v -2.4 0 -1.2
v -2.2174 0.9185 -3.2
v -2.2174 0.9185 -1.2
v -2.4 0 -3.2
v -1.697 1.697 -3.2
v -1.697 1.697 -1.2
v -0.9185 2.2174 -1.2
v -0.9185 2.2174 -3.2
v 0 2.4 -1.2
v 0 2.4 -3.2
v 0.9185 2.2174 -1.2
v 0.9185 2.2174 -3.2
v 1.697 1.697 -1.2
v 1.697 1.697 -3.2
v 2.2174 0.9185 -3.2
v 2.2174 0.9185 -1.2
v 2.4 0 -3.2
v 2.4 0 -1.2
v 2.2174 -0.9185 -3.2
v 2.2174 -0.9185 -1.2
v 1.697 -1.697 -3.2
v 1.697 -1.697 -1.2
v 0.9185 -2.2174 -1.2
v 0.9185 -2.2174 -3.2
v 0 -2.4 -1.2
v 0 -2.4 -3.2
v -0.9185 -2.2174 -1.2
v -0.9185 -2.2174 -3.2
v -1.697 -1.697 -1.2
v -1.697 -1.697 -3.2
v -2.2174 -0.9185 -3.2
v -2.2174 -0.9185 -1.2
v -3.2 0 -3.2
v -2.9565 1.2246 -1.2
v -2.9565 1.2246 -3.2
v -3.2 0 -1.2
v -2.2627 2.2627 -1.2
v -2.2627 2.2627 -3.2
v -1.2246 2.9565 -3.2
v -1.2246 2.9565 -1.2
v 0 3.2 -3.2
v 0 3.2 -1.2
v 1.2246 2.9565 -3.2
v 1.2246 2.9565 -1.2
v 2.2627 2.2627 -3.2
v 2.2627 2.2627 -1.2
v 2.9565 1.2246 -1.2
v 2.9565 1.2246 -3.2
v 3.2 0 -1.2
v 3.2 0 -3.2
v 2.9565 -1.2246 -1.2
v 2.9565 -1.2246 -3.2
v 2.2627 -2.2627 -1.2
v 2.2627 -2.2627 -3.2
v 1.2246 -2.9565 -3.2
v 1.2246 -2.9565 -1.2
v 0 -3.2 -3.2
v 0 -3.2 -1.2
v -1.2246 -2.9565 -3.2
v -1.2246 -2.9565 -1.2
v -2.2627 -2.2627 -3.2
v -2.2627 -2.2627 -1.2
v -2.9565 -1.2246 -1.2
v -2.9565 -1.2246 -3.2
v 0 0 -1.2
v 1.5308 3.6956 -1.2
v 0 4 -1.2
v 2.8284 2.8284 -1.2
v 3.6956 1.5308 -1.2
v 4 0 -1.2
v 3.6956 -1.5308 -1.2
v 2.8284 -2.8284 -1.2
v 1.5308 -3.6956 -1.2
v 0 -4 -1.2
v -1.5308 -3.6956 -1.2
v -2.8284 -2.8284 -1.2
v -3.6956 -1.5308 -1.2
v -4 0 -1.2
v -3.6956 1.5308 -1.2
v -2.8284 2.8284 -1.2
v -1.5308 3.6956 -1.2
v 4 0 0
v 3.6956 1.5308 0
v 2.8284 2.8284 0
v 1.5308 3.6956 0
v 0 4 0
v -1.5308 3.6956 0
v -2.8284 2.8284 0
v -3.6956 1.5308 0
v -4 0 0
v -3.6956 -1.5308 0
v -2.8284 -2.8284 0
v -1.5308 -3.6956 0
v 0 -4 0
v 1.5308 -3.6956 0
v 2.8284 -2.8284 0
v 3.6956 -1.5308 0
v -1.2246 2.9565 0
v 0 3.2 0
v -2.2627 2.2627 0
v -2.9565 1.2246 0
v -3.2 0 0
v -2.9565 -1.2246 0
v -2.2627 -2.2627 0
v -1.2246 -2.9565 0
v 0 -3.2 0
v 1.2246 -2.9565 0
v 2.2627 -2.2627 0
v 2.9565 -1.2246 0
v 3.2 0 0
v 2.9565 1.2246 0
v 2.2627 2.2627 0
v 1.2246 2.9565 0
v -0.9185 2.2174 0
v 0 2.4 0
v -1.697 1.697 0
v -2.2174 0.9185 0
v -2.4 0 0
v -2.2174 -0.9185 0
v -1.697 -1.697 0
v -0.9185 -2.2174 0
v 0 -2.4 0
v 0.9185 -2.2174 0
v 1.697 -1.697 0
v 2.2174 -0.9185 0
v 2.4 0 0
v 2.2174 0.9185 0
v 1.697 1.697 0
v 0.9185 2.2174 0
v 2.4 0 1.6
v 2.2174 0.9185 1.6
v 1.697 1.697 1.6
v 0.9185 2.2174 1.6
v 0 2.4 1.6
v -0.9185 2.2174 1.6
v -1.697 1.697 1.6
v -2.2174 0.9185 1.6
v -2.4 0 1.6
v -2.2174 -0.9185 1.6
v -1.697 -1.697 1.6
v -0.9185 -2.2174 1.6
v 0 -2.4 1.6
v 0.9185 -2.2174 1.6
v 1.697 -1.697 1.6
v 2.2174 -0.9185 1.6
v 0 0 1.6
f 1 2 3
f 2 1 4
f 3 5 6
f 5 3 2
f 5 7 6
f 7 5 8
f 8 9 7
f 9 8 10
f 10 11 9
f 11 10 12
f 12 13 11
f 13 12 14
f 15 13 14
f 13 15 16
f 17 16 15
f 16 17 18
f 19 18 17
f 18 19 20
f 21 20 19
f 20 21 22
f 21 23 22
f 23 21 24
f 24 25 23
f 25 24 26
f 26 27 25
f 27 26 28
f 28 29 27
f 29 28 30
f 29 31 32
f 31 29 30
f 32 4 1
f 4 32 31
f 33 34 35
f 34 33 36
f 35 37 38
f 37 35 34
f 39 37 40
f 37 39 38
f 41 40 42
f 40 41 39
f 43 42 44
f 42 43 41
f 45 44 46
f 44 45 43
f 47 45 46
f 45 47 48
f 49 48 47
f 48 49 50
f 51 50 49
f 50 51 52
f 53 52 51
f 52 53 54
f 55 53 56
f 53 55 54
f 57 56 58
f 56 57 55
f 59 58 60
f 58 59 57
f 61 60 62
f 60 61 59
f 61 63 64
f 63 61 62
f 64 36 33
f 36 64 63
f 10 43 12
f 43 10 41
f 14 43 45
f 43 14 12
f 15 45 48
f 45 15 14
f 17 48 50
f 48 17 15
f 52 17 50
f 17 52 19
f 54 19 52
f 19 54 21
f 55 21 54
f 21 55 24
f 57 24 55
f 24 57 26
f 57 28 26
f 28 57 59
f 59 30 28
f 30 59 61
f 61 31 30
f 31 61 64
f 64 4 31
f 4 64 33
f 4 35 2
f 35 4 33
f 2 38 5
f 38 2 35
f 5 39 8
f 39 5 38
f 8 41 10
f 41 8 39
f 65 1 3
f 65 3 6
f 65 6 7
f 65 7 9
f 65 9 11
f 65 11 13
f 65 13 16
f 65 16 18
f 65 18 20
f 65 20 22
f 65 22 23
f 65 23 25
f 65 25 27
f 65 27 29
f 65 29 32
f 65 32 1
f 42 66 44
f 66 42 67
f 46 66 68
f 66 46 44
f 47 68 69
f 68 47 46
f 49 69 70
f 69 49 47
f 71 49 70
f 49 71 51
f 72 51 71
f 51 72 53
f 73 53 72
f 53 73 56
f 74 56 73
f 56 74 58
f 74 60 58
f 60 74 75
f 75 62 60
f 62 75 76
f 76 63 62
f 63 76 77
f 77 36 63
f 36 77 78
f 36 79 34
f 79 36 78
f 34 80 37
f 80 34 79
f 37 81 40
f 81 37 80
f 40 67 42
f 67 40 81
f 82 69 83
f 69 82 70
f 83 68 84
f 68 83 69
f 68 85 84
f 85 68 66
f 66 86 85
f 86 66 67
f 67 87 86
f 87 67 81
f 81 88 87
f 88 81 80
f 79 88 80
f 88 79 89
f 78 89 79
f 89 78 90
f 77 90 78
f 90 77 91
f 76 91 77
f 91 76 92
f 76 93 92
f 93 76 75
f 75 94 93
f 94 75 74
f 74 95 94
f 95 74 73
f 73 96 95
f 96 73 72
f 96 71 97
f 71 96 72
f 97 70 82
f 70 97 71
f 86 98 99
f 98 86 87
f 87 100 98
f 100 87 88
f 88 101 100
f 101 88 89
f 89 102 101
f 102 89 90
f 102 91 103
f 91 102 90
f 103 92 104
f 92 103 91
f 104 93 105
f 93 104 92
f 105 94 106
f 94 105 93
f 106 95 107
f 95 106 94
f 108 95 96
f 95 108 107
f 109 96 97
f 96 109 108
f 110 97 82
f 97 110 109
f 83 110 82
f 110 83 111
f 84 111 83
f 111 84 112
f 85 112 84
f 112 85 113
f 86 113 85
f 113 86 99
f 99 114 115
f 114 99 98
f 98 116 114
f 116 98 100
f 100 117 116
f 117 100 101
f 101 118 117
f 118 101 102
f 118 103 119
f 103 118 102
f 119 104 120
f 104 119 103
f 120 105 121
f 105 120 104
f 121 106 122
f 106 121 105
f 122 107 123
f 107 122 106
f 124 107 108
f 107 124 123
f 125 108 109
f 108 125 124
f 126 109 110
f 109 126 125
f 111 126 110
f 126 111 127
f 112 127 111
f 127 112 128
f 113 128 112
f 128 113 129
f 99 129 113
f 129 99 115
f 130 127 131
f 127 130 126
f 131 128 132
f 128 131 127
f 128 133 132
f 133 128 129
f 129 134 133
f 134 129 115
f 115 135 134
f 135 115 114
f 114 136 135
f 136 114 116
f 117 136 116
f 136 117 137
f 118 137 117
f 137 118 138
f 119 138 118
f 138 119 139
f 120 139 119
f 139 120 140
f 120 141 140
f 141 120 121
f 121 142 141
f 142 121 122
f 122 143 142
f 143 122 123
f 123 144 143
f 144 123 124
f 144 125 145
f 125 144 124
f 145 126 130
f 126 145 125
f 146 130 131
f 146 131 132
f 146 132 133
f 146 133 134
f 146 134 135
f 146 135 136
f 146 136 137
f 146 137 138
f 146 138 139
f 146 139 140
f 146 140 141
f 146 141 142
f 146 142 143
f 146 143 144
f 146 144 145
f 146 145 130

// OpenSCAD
// file: ../p/4-4edge.scad
use <../lib.scad>
function ldraw_lib__4_4edge() = [
// 0 Circle 1.0
// 0 Name: 4-4edge.dat
// 0 Author: James Jessiman
// 0 !LDRAW_ORG Primitive UPDATE 2017-01
// 0 !LICENSE Licensed under CC BY 2.0 and CC BY 4.0 : see CAreadme.txt
// 
// 0 BFC CERTIFY CCW
  [0,"BFC","CERTIFY"],
  [0,"BFC","CCW"],
// 
// 0 !HISTORY 1998-12-15 [PTadmin] Official Update 1998-10
// 0 !HISTORY 2005-12-28 [PTadmin] Official Update 2005-01
// 0 !HISTORY 2007-06-24 [PTadmin] Header formatted for Contributor Agreement
// 0 !HISTORY 2008-07-01 [PTadmin] Official Update 2008-01
// 0 !HISTORY 2017-01-15 [Steffen] BFCed
// 0 !HISTORY 2017-12-30 [PTadmin] Official Update 2017-01
// 
// 
// 2 24 1 0 0 0.9239 0 0.3827
  [2,24,1,0,0,0.9239,0,0.3827],
// 2 24 0.9239 0 0.3827 0.7071 0 0.7071
  [2,24,0.9239,0,0.3827,0.7071,0,0.7071],
// 2 24 0.7071 0 0.7071 0.3827 0 0.9239
  [2,24,0.7071,0,0.7071,0.3827,0,0.9239],
// 2 24 0.3827 0 0.9239 0 0 1
  [2,24,0.3827,0,0.9239,0,0,1],
// 2 24 0 0 1 -0.3827 0 0.9239
  [2,24,0,0,1,-0.3827,0,0.9239],
// 2 24 -0.3827 0 0.9239 -0.7071 0 0.7071
  [2,24,-0.3827,0,0.9239,-0.7071,0,0.7071],
// 2 24 -0.7071 0 0.7071 -0.9239 0 0.3827
  [2,24,-0.7071,0,0.7071,-0.9239,0,0.3827],
// 2 24 -0.9239 0 0.3827 -1 0 -0
  [2,24,-0.9239,0,0.3827,-1,0,-0],
// 2 24 -1 0 -0 -0.9239 0 -0.3827
  [2,24,-1,0,-0,-0.9239,0,-0.3827],
// 2 24 -0.9239 0 -0.3827 -0.7071 0 -0.7071
  [2,24,-0.9239,0,-0.3827,-0.7071,0,-0.7071],
// 2 24 -0.7071 0 -0.7071 -0.3827 0 -0.9239
  [2,24,-0.7071,0,-0.7071,-0.3827,0,-0.9239],
// 2 24 -0.3827 0 -0.9239 0 0 -1
  [2,24,-0.3827,0,-0.9239,0,0,-1],
// 2 24 0 0 -1 0.3827 0 -0.9239
  [2,24,0,0,-1,0.3827,0,-0.9239],
// 2 24 0.3827 0 -0.9239 0.7071 0 -0.7071
  [2,24,0.3827,0,-0.9239,0.7071,0,-0.7071],
// 2 24 0.7071 0 -0.7071 0.9239 0 -0.3827
  [2,24,0.7071,0,-0.7071,0.9239,0,-0.3827],
// 2 24 0.9239 0 -0.3827 1 0 0
  [2,24,0.9239,0,-0.3827,1,0,0],
];
makepoly(ldraw_lib__4_4edge(), line=0.2);
// file: ../p/4-4cyli.scad
use <../lib.scad>
function ldraw_lib__4_4cyli() = [
// 0 Cylinder 1.0
// 0 Name: 4-4cyli.dat
// 0 Author: James Jessiman
// 0 !LDRAW_ORG Primitive UPDATE 2005-01
// 0 !LICENSE Licensed under CC BY 2.0 and CC BY 4.0 : see CAreadme.txt
// 
// 0 BFC CERTIFY CCW
  [0,"BFC","CERTIFY"],
  [0,"BFC","CCW"],
// 
// 0 !HISTORY 1998-12-15 [PTadmin] Official Update 1998-10
// 0 !HISTORY 2002-03-23 [sbliss] Added BFC statement; merged headers from files in distributions LDraw 0.27 and Complete.
// 0 !HISTORY 2002-04-25 [PTadmin] Official Update 2002-02
// 0 !HISTORY 2004-12-14 [guyvivan] BFC CCW
// 0 !HISTORY 2005-12-28 [PTadmin] Official Update 2005-01
// 0 !HISTORY 2007-06-24 [PTadmin] Header formatted for Contributor Agreement
// 0 !HISTORY 2008-07-01 [PTadmin] Official Update 2008-01
// 
// 
// 4 16 1 1 0 0.9239 1 0.3827 0.9239 0 0.3827 1 0 0
  [4,16,1,1,0,0.9239,1,0.3827,0.9239,0,0.3827,1,0,0],
// 5 24 1 0 0 1 1 0 0.9239 0 0.3827 0.9239 0 -0.3827
  [5,24,1,0,0,1,1,0,0.9239,0,0.3827,0.9239,0,-0.3827],
// 4 16 0.9239 1 0.3827 0.7071 1 0.7071 0.7071 0 0.7071 0.9239 0 0.3827
  [4,16,0.9239,1,0.3827,0.7071,1,0.7071,0.7071,0,0.7071,0.9239,0,0.3827],
// 5 24 0.9239 0 0.3827 0.9239 1 0.3827 0.7071 0 0.7071 1 0 0
  [5,24,0.9239,0,0.3827,0.9239,1,0.3827,0.7071,0,0.7071,1,0,0],
// 4 16 0.7071 1 0.7071 0.3827 1 0.9239 0.3827 0 0.9239 0.7071 0 0.7071
  [4,16,0.7071,1,0.7071,0.3827,1,0.9239,0.3827,0,0.9239,0.7071,0,0.7071],
// 5 24 0.7071 0 0.7071 0.7071 1 0.7071 0.3827 0 0.9239 0.9239 0 0.3827
  [5,24,0.7071,0,0.7071,0.7071,1,0.7071,0.3827,0,0.9239,0.9239,0,0.3827],
// 4 16 0.3827 1 0.9239 0 1 1 0 0 1 0.3827 0 0.9239
  [4,16,0.3827,1,0.9239,0,1,1,0,0,1,0.3827,0,0.9239],
// 5 24 0.3827 0 0.9239 0.3827 1 0.9239 0 0 1 0.7071 0 0.7071
  [5,24,0.3827,0,0.9239,0.3827,1,0.9239,0,0,1,0.7071,0,0.7071],
// 4 16 0 1 1 -0.3827 1 0.9239 -0.3827 0 0.9239 0 0 1
  [4,16,0,1,1,-0.3827,1,0.9239,-0.3827,0,0.9239,0,0,1],
// 5 24 0 0 1 0 1 1 -0.3827 0 0.9239 0.3827 0 0.9239
  [5,24,0,0,1,0,1,1,-0.3827,0,0.9239,0.3827,0,0.9239],
// 4 16 -0.3827 1 0.9239 -0.7071 1 0.7071 -0.7071 0 0.7071 -0.3827 0 0.9239
  [4,16,-0.3827,1,0.9239,-0.7071,1,0.7071,-0.7071,0,0.7071,-0.3827,0,0.9239],
// 5 24 -0.3827 0 0.9239 -0.3827 1 0.9239 -0.7071 0 0.7071 0 0 1
  [5,24,-0.3827,0,0.9239,-0.3827,1,0.9239,-0.7071,0,0.7071,0,0,1],
// 4 16 -0.7071 1 0.7071 -0.9239 1 0.3827 -0.9239 0 0.3827 -0.7071 0 0.7071
  [4,16,-0.7071,1,0.7071,-0.9239,1,0.3827,-0.9239,0,0.3827,-0.7071,0,0.7071],
// 5 24 -0.7071 0 0.7071 -0.7071 1 0.7071 -0.9239 0 0.3827 -0.3827 0 0.9239
  [5,24,-0.7071,0,0.7071,-0.7071,1,0.7071,-0.9239,0,0.3827,-0.3827,0,0.9239],
// 4 16 -0.9239 1 0.3827 -1 1 0 -1 0 0 -0.9239 0 0.3827
  [4,16,-0.9239,1,0.3827,-1,1,0,-1,0,0,-0.9239,0,0.3827],
// 5 24 -0.9239 0 0.3827 -0.9239 1 0.3827 -1 0 0 -0.7071 0 0.7071
  [5,24,-0.9239,0,0.3827,-0.9239,1,0.3827,-1,0,0,-0.7071,0,0.7071],
// 4 16 -1 1 0 -0.9239 1 -0.3827 -0.9239 0 -0.3827 -1 0 0
  [4,16,-1,1,0,-0.9239,1,-0.3827,-0.9239,0,-0.3827,-1,0,0],
// 5 24 -1 0 0 -1 1 0 -0.9239 0 -0.3827 -0.9239 0 0.3827
  [5,24,-1,0,0,-1,1,0,-0.9239,0,-0.3827,-0.9239,0,0.3827],
// 4 16 -0.9239 1 -0.3827 -0.7071 1 -0.7071 -0.7071 0 -0.7071 -0.9239 0 -0.3827
  [4,16,-0.9239,1,-0.3827,-0.7071,1,-0.7071,-0.7071,0,-0.7071,-0.9239,0,-0.3827],
// 5 24 -0.9239 0 -0.3827 -0.9239 1 -0.3827 -0.7071 0 -0.7071 -1 0 0
  [5,24,-0.9239,0,-0.3827,-0.9239,1,-0.3827,-0.7071,0,-0.7071,-1,0,0],
// 4 16 -0.7071 1 -0.7071 -0.3827 1 -0.9239 -0.3827 0 -0.9239 -0.7071 0 -0.7071
  [4,16,-0.7071,1,-0.7071,-0.3827,1,-0.9239,-0.3827,0,-0.9239,-0.7071,0,-0.7071],
// 5 24 -0.7071 0 -0.7071 -0.7071 1 -0.7071 -0.3827 0 -0.9239 -0.9239 0 -0.3827
  [5,24,-0.7071,0,-0.7071,-0.7071,1,-0.7071,-0.3827,0,-0.9239,-0.9239,0,-0.3827],
// 4 16 -0.3827 1 -0.9239 0 1 -1 0 0 -1 -0.3827 0 -0.9239
  [4,16,-0.3827,1,-0.9239,0,1,-1,0,0,-1,-0.3827,0,-0.9239],
// 5 24 -0.3827 0 -0.9239 -0.3827 1 -0.9239 0 0 -1 -0.7071 0 -0.7071
  [5,24,-0.3827,0,-0.9239,-0.3827,1,-0.9239,0,0,-1,-0.7071,0,-0.7071],
// 4 16 0 1 -1 0.3827 1 -0.9239 0.3827 0 -0.9239 0 0 -1
  [4,16,0,1,-1,0.3827,1,-0.9239,0.3827,0,-0.9239,0,0,-1],
// 5 24 0 0 -1 0 1 -1 0.3827 0 -0.9239 -0.3827 0 -0.9239
  [5,24,0,0,-1,0,1,-1,0.3827,0,-0.9239,-0.3827,0,-0.9239],
// 4 16 0.3827 1 -0.9239 0.7071 1 -0.7071 0.7071 0 -0.7071 0.3827 0 -0.9239
  [4,16,0.3827,1,-0.9239,0.7071,1,-0.7071,0.7071,0,-0.7071,0.3827,0,-0.9239],
// 5 24 0.3827 0 -0.9239 0.3827 1 -0.9239 0.7071 0 -0.7071 0 0 -1
  [5,24,0.3827,0,-0.9239,0.3827,1,-0.9239,0.7071,0,-0.7071,0,0,-1],
// 4 16 0.7071 1 -0.7071 0.9239 1 -0.3827 0.9239 0 -0.3827 0.7071 0 -0.7071
  [4,16,0.7071,1,-0.7071,0.9239,1,-0.3827,0.9239,0,-0.3827,0.7071,0,-0.7071],
// 5 24 0.7071 0 -0.7071 0.7071 1 -0.7071 0.9239 0 -0.3827 0.3827 0 -0.9239
  [5,24,0.7071,0,-0.7071,0.7071,1,-0.7071,0.9239,0,-0.3827,0.3827,0,-0.9239],
// 4 16 0.9239 1 -0.3827 1 1 0 1 0 0 0.9239 0 -0.3827
  [4,16,0.9239,1,-0.3827,1,1,0,1,0,0,0.9239,0,-0.3827],
// 5 24 0.9239 0 -0.3827 0.9239 1 -0.3827 1 0 0 0.7071 0 -0.7071
  [5,24,0.9239,0,-0.3827,0.9239,1,-0.3827,1,0,0,0.7071,0,-0.7071],
// 0
];
makepoly(ldraw_lib__4_4cyli(), line=0.2);
// file: ../p/stud4.scad
use <../lib.scad>
use <4-4cyli.scad>
use <4-4edge.scad>
use <4-4ring3.scad>
function ldraw_lib__stud4() = [
// 0 Stud Tube Open
// 0 Name: stud4.dat
// 0 Author: James Jessiman
// 0 !LDRAW_ORG Primitive UPDATE 2009-02
// 0 !LICENSE Licensed under CC BY 2.0 and CC BY 4.0 : see CAreadme.txt
// 
// 0 BFC CERTIFY CCW
  [0,"BFC","CERTIFY"],
  [0,"BFC","CCW"],
// 
// 0 !HISTORY 1999-07-05 [PTadmin] Official Update 1999-05
// 0 !HISTORY 2002-04-04 [sbliss] Modified for BFC compliance
// 0 !HISTORY 2002-04-25 [PTadmin] Official Update 2002-02
// 0 !HISTORY 2007-06-24 [PTadmin] Header formatted for Contributor Agreement
// 0 !HISTORY 2008-07-01 [PTadmin] Official Update 2008-01
// 0 !HISTORY 2009-06-21 [cwdee] Update ring references to 4-4ring
// 0 !HISTORY 2009-09-03 [PTadmin] Official Update 2009-02
// 
// 
// 1 16 0 -4 0 6 0 0 0 1 0 0 0 6 4-4edge.dat
  [1,16,0,-4,0,6,0,0,0,1,0,0,0,6, ldraw_lib__4_4edge()],
// 1 16 0 -4 0 8 0 0 0 1 0 0 0 8 4-4edge.dat
  [1,16,0,-4,0,8,0,0,0,1,0,0,0,8, ldraw_lib__4_4edge()],
// 1 16 0 0 0 6 0 0 0 1 0 0 0 6 4-4edge.dat
  [1,16,0,0,0,6,0,0,0,1,0,0,0,6, ldraw_lib__4_4edge()],
// 1 16 0 0 0 8 0 0 0 1 0 0 0 8 4-4edge.dat
  [1,16,0,0,0,8,0,0,0,1,0,0,0,8, ldraw_lib__4_4edge()],
// 0 BFC INVERTNEXT
  [0,"BFC","INVERTNEXT"],
// 1 16 0 -4 0 6 0 0 0 4 0 0 0 6 4-4cyli.dat
  [1,16,0,-4,0,6,0,0,0,4,0,0,0,6, ldraw_lib__4_4cyli()],
// 1 16 0 -4 0 8 0 0 0 4 0 0 0 8 4-4cyli.dat
  [1,16,0,-4,0,8,0,0,0,4,0,0,0,8, ldraw_lib__4_4cyli()],
// 1 16 0 -4 0 2 0 0 0 1 0 0 0 2 4-4ring3.dat
  [1,16,0,-4,0,2,0,0,0,1,0,0,0,2, ldraw_lib__4_4ring3()],
// 0
];
makepoly(ldraw_lib__stud4(), line=0.2);
// file: ../p/stud.scad
use <../lib.scad>
use <4-4cyli.scad>
use <4-4disc.scad>
use <4-4edge.scad>
function ldraw_lib__stud() = [
// 0 Stud
// 0 Name: stud.dat
// 0 Author: James Jessiman
// 0 !LDRAW_ORG Primitive UPDATE 2012-01
// 0 !LICENSE Licensed under CC BY 2.0 and CC BY 4.0 : see CAreadme.txt
// 
// 0 BFC CERTIFY CCW
  [0,"BFC","CERTIFY"],
  [0,"BFC","CCW"],
// 
// 0 !HISTORY 2002-04-04 [sbliss] Modified for BFC compliance
// 0 !HISTORY 2002-04-25 [PTadmin] Official Update 2002-02
// 0 !HISTORY 2007-06-24 [PTadmin] Header formatted for Contributor Agreement
// 0 !HISTORY 2008-07-01 [PTadmin] Official Update 2008-01
// 0 !HISTORY 2012-02-16 [Philo] Changed to CCW
// 0 !HISTORY 2012-03-30 [PTadmin] Official Update 2012-01
// 
// 
// 1 16 0 0 0 6 0 0 0 1 0 0 0 6 4-4edge.dat
  [1,16,0,0,0,6,0,0,0,1,0,0,0,6, ldraw_lib__4_4edge()],
// 1 16 0 -4 0 6 0 0 0 1 0 0 0 6 4-4edge.dat
  [1,16,0,-4,0,6,0,0,0,1,0,0,0,6, ldraw_lib__4_4edge()],
// 1 16 0 0 0 6 0 0 0 -4 0 0 0 6 4-4cyli.dat
  [1,16,0,0,0,6,0,0,0,-4,0,0,0,6, ldraw_lib__4_4cyli()],
// 1 16 0 -4 0 6 0 0 0 1 0 0 0 6 4-4disc.dat
  [1,16,0,-4,0,6,0,0,0,1,0,0,0,6, ldraw_lib__4_4disc()],
];
makepoly(ldraw_lib__stud(), line=0.2);
// file: ../p/4-4ring4.scad
use <../lib.scad>
function ldraw_lib__4_4ring4() = [
// 0 Ring  4 x 1.0
// 0 Name: 4-4ring4.dat
// 0 Author: James Jessiman
// 0 !LDRAW_ORG Primitive UPDATE 2009-01
// 0 !LICENSE Licensed under CC BY 2.0 and CC BY 4.0 : see CAreadme.txt
// 
// 0 BFC CERTIFY CCW
  [0,"BFC","CERTIFY"],
  [0,"BFC","CCW"],
// 
// 0 !HISTORY 1998-12-15 [PTadmin] Official Update 1998-10
// 0 !HISTORY 2002-04-08 [BrickCaster] Modified for BFC compliance
// 0 !HISTORY 2002-04-25 [PTadmin] Official Update 2002-02
// 0 !HISTORY 2007-06-24 [PTadmin] Header formatted for Contributor Agreement
// 0 !HISTORY 2008-07-01 [PTadmin] Official Update 2008-01
// 0 !HISTORY 2008-08-26 [cwdee] Switch polygon winding and rename
// 0 !HISTORY 2009-05-02 [PTadmin] Official Update 2009-01
// 
// 
// 4 16 -1.9135 0 4.6195 -1.5308 0 3.6956 0 0 4 0 0 5
  [4,16,-1.9135,0,4.6195,-1.5308,0,3.6956,0,0,4,0,0,5],
// 4 16 -3.5355 0 3.5355 -2.8284 0 2.8284 -1.5308 0 3.6956 -1.9135 0 4.6195
  [4,16,-3.5355,0,3.5355,-2.8284,0,2.8284,-1.5308,0,3.6956,-1.9135,0,4.6195],
// 4 16 -4.6195 0 1.9135 -3.6956 0 1.5308 -2.8284 0 2.8284 -3.5355 0 3.5355
  [4,16,-4.6195,0,1.9135,-3.6956,0,1.5308,-2.8284,0,2.8284,-3.5355,0,3.5355],
// 4 16 -5 0 0 -4 0 0 -3.6956 0 1.5308 -4.6195 0 1.9135
  [4,16,-5,0,0,-4,0,0,-3.6956,0,1.5308,-4.6195,0,1.9135],
// 4 16 -4.6195 0 -1.9135 -3.6956 0 -1.5308 -4 0 0 -5 0 0
  [4,16,-4.6195,0,-1.9135,-3.6956,0,-1.5308,-4,0,0,-5,0,0],
// 4 16 -3.5355 0 -3.5355 -2.8284 0 -2.8284 -3.6956 0 -1.5308 -4.6195 0 -1.9135
  [4,16,-3.5355,0,-3.5355,-2.8284,0,-2.8284,-3.6956,0,-1.5308,-4.6195,0,-1.9135],
// 4 16 -1.9135 0 -4.6195 -1.5308 0 -3.6956 -2.8284 0 -2.8284 -3.5355 0 -3.5355
  [4,16,-1.9135,0,-4.6195,-1.5308,0,-3.6956,-2.8284,0,-2.8284,-3.5355,0,-3.5355],
// 4 16 0 0 -5 0 0 -4 -1.5308 0 -3.6956 -1.9135 0 -4.6195
  [4,16,0,0,-5,0,0,-4,-1.5308,0,-3.6956,-1.9135,0,-4.6195],
// 4 16 1.9135 0 -4.6195 1.5308 0 -3.6956 0 0 -4 0 0 -5
  [4,16,1.9135,0,-4.6195,1.5308,0,-3.6956,0,0,-4,0,0,-5],
// 4 16 3.5355 0 -3.5355 2.8284 0 -2.8284 1.5308 0 -3.6956 1.9135 0 -4.6195
  [4,16,3.5355,0,-3.5355,2.8284,0,-2.8284,1.5308,0,-3.6956,1.9135,0,-4.6195],
// 4 16 4.6195 0 -1.9135 3.6956 0 -1.5308 2.8284 0 -2.8284 3.5355 0 -3.5355
  [4,16,4.6195,0,-1.9135,3.6956,0,-1.5308,2.8284,0,-2.8284,3.5355,0,-3.5355],
// 4 16 5 0 0 4 0 0 3.6956 0 -1.5308 4.6195 0 -1.9135
  [4,16,5,0,0,4,0,0,3.6956,0,-1.5308,4.6195,0,-1.9135],
// 4 16 4.6195 0 1.9135 3.6956 0 1.5308 4 0 0 5 0 0
  [4,16,4.6195,0,1.9135,3.6956,0,1.5308,4,0,0,5,0,0],
// 4 16 3.5355 0 3.5355 2.8284 0 2.8284 3.6956 0 1.5308 4.6195 0 1.9135
  [4,16,3.5355,0,3.5355,2.8284,0,2.8284,3.6956,0,1.5308,4.6195,0,1.9135],
// 4 16 1.9135 0 4.6195 1.5308 0 3.6956 2.8284 0 2.8284 3.5355 0 3.5355
  [4,16,1.9135,0,4.6195,1.5308,0,3.6956,2.8284,0,2.8284,3.5355,0,3.5355],
// 4 16 0 0 5 0 0 4 1.5308 0 3.6956 1.9135 0 4.6195
  [4,16,0,0,5,0,0,4,1.5308,0,3.6956,1.9135,0,4.6195],
// 0
];
makepoly(ldraw_lib__4_4ring4(), line=0.2);
// file: ../p/4-4ring3.scad
use <../lib.scad>
function ldraw_lib__4_4ring3() = [
// 0 Ring  3 x 1.0
// 0 Name: 4-4ring3.dat
// 0 Author: James Jessiman
// 0 !LDRAW_ORG Primitive UPDATE 2009-01
// 0 !LICENSE Licensed under CC BY 2.0 and CC BY 4.0 : see CAreadme.txt
// 
// 0 BFC CERTIFY CCW
  [0,"BFC","CERTIFY"],
  [0,"BFC","CCW"],
// 
// 0 !HISTORY 1998-12-15 [PTadmin] Official Update 1998-10
// 0 !HISTORY 2002-04-05 [hafhead] Added BFC statement
// 0 !HISTORY 2002-04-25 [PTadmin] Official Update 2002-02
// 0 !HISTORY 2007-06-24 [PTadmin] Header formatted for Contributor Agreement
// 0 !HISTORY 2008-07-01 [PTadmin] Official Update 2008-01
// 0 !HISTORY 2008-08-26 [cwdee] Switch polygon winding and rename
// 0 !HISTORY 2009-05-02 [PTadmin] Official Update 2009-01
// 
// 
// 4 16 -1.5308 0 3.6956 -1.1481 0 2.7717 0 0 3 0 0 4
  [4,16,-1.5308,0,3.6956,-1.1481,0,2.7717,0,0,3,0,0,4],
// 4 16 -2.8284 0 2.8284 -2.1213 0 2.1213 -1.1481 0 2.7717 -1.5308 0 3.6956
  [4,16,-2.8284,0,2.8284,-2.1213,0,2.1213,-1.1481,0,2.7717,-1.5308,0,3.6956],
// 4 16 -3.6956 0 1.5308 -2.7717 0 1.1481 -2.1213 0 2.1213 -2.8284 0 2.8284
  [4,16,-3.6956,0,1.5308,-2.7717,0,1.1481,-2.1213,0,2.1213,-2.8284,0,2.8284],
// 4 16 -4 0 0 -3 0 0 -2.7717 0 1.1481 -3.6956 0 1.5308
  [4,16,-4,0,0,-3,0,0,-2.7717,0,1.1481,-3.6956,0,1.5308],
// 4 16 -3.6956 0 -1.5308 -2.7717 0 -1.1481 -3 0 0 -4 0 0
  [4,16,-3.6956,0,-1.5308,-2.7717,0,-1.1481,-3,0,0,-4,0,0],
// 4 16 -2.8284 0 -2.8284 -2.1213 0 -2.1213 -2.7717 0 -1.1481 -3.6956 0 -1.5308
  [4,16,-2.8284,0,-2.8284,-2.1213,0,-2.1213,-2.7717,0,-1.1481,-3.6956,0,-1.5308],
// 4 16 -1.5308 0 -3.6956 -1.1481 0 -2.7717 -2.1213 0 -2.1213 -2.8284 0 -2.8284
  [4,16,-1.5308,0,-3.6956,-1.1481,0,-2.7717,-2.1213,0,-2.1213,-2.8284,0,-2.8284],
// 4 16 0 0 -4 0 0 -3 -1.1481 0 -2.7717 -1.5308 0 -3.6956
  [4,16,0,0,-4,0,0,-3,-1.1481,0,-2.7717,-1.5308,0,-3.6956],
// 4 16 1.5308 0 -3.6956 1.1481 0 -2.7717 0 0 -3 0 0 -4
  [4,16,1.5308,0,-3.6956,1.1481,0,-2.7717,0,0,-3,0,0,-4],
// 4 16 2.8284 0 -2.8284 2.1213 0 -2.1213 1.1481 0 -2.7717 1.5308 0 -3.6956
  [4,16,2.8284,0,-2.8284,2.1213,0,-2.1213,1.1481,0,-2.7717,1.5308,0,-3.6956],
// 4 16 3.6956 0 -1.5308 2.7717 0 -1.1481 2.1213 0 -2.1213 2.8284 0 -2.8284
  [4,16,3.6956,0,-1.5308,2.7717,0,-1.1481,2.1213,0,-2.1213,2.8284,0,-2.8284],
// 4 16 4 0 0 3 0 0 2.7717 0 -1.1481 3.6956 0 -1.5308
  [4,16,4,0,0,3,0,0,2.7717,0,-1.1481,3.6956,0,-1.5308],
// 4 16 3.6956 0 1.5308 2.7717 0 1.1481 3 0 0 4 0 0
  [4,16,3.6956,0,1.5308,2.7717,0,1.1481,3,0,0,4,0,0],
// 4 16 2.8284 0 2.8284 2.1213 0 2.1213 2.7717 0 1.1481 3.6956 0 1.5308
  [4,16,2.8284,0,2.8284,2.1213,0,2.1213,2.7717,0,1.1481,3.6956,0,1.5308],
// 4 16 1.5308 0 3.6956 1.1481 0 2.7717 2.1213 0 2.1213 2.8284 0 2.8284
  [4,16,1.5308,0,3.6956,1.1481,0,2.7717,2.1213,0,2.1213,2.8284,0,2.8284],
// 4 16 0 0 4 0 0 3 1.1481 0 2.7717 1.5308 0 3.6956
  [4,16,0,0,4,0,0,3,1.1481,0,2.7717,1.5308,0,3.6956],
// 0
];
makepoly(ldraw_lib__4_4ring3(), line=0.2);
// file: ../p/4-4disc.scad
use <../lib.scad>
function ldraw_lib__4_4disc() = [
// 0 Disc 1.0
// 0 Name: 4-4disc.dat
// 0 Author: James Jessiman
// 0 !LDRAW_ORG Primitive UPDATE 2002-02
// 0 !LICENSE Licensed under CC BY 2.0 and CC BY 4.0 : see CAreadme.txt
// 
// 0 BFC CERTIFY CCW
  [0,"BFC","CERTIFY"],
  [0,"BFC","CCW"],
// 
// 0 !HISTORY 1998-12-15 [PTadmin] Official Update 1998-10
// 0 !HISTORY 2002-03-23 [sbliss] Added BFC statement
// 0 !HISTORY 2002-04-25 [PTadmin] Official Update 2002-02
// 0 !HISTORY 2007-06-24 [PTadmin] Header formatted for Contributor Agreement
// 0 !HISTORY 2008-07-01 [PTadmin] Official Update 2008-01
// 
// 
// 3 16 0 0 0 1 0 0 0.9239 0 0.3827
  [3,16,0,0,0,1,0,0,0.9239,0,0.3827],
// 3 16 0 0 0 0.9239 0 0.3827 0.7071 0 0.7071
  [3,16,0,0,0,0.9239,0,0.3827,0.7071,0,0.7071],
// 3 16 0 0 0 0.7071 0 0.7071 0.3827 0 0.9239
  [3,16,0,0,0,0.7071,0,0.7071,0.3827,0,0.9239],
// 3 16 0 0 0 0.3827 0 0.9239 0 0 1
  [3,16,0,0,0,0.3827,0,0.9239,0,0,1],
// 3 16 0 0 0 0 0 1 -0.3827 0 0.9239
  [3,16,0,0,0,0,0,1,-0.3827,0,0.9239],
// 3 16 0 0 0 -0.3827 0 0.9239 -0.7071 0 0.7071
  [3,16,0,0,0,-0.3827,0,0.9239,-0.7071,0,0.7071],
// 3 16 0 0 0 -0.7071 0 0.7071 -0.9239 0 0.3827
  [3,16,0,0,0,-0.7071,0,0.7071,-0.9239,0,0.3827],
// 3 16 0 0 0 -0.9239 0 0.3827 -1 0 -0
  [3,16,0,0,0,-0.9239,0,0.3827,-1,0,-0],
// 3 16 0 0 0 -1 0 -0 -0.9239 0 -0.3827
  [3,16,0,0,0,-1,0,-0,-0.9239,0,-0.3827],
// 3 16 0 0 0 -0.9239 0 -0.3827 -0.7071 0 -0.7071
  [3,16,0,0,0,-0.9239,0,-0.3827,-0.7071,0,-0.7071],
// 3 16 0 0 0 -0.7071 0 -0.7071 -0.3827 0 -0.9239
  [3,16,0,0,0,-0.7071,0,-0.7071,-0.3827,0,-0.9239],
// 3 16 0 0 0 -0.3827 0 -0.9239 0 0 -1
  [3,16,0,0,0,-0.3827,0,-0.9239,0,0,-1],
// 3 16 0 0 0 0 0 -1 0.3827 0 -0.9239
  [3,16,0,0,0,0,0,-1,0.3827,0,-0.9239],
// 3 16 0 0 0 0.3827 0 -0.9239 0.7071 0 -0.7071
  [3,16,0,0,0,0.3827,0,-0.9239,0.7071,0,-0.7071],
// 3 16 0 0 0 0.7071 0 -0.7071 0.9239 0 -0.3827
  [3,16,0,0,0,0.7071,0,-0.7071,0.9239,0,-0.3827],
// 3 16 0 0 0 0.9239 0 -0.3827 1 0 0
  [3,16,0,0,0,0.9239,0,-0.3827,1,0,0],
// 0
];
makepoly(ldraw_lib__4_4disc(), line=0.2);
// file: ../p/4-4cylo.scad
use <../lib.scad>
use <4-4cyli.scad>
use <4-4edge.scad>
function ldraw_lib__4_4cylo() = [
// 0 Cylinder Open 1.0
// 0 Name: 4-4cylo.dat
// 0 Author: Mark Kennedy [mkennedy]
// 0 !LDRAW_ORG Primitive UPDATE 2010-01
// 0 !LICENSE Licensed under CC BY 2.0 and CC BY 4.0 : see CAreadme.txt
// 
// 0 BFC CERTIFY CCW
  [0,"BFC","CERTIFY"],
  [0,"BFC","CCW"],
// 
// 0 !HISTORY 2010-04-05 [PTadmin] Official Update 2010-01
// 
// 
// 1 16 0 0 0 1 0 0 0 1 0 0 0 1 4-4edge.dat
  [1,16,0,0,0,1,0,0,0,1,0,0,0,1, ldraw_lib__4_4edge()],
// 1 16 0 1 0 1 0 0 0 1 0 0 0 1 4-4edge.dat
  [1,16,0,1,0,1,0,0,0,1,0,0,0,1, ldraw_lib__4_4edge()],
// 1 16 0 0 0 1 0 0 0 1 0 0 0 1 4-4cyli.dat
  [1,16,0,0,0,1,0,0,0,1,0,0,0,1, ldraw_lib__4_4cyli()],
// 0
];
makepoly(ldraw_lib__4_4cylo(), line=0.2);
// file: 6141.scad
use <../lib.scad>
use <../p/4-4cylo.scad>
use <../p/4-4disc.scad>
use <../p/4-4ring3.scad>
use <../p/4-4ring4.scad>
use <../p/stud.scad>
use <../p/stud4.scad>
function ldraw_lib__6141() = [
// 0 Plate  1 x  1 Round
// 0 Name: 6141.dat
// 0 Author: James Jessiman
// 0 !LDRAW_ORG Part UPDATE 2015-01
// 0 !LICENSE Licensed under CC BY 2.0 and CC BY 4.0 : see CAreadme.txt
// 
// 0 BFC CERTIFY CCW
  [0,"BFC","CERTIFY"],
  [0,"BFC","CCW"],
// 
// 0 !HISTORY 1998-06-20 [PTadmin] Official Update 1998-06
// 0 !HISTORY 2003-01-29 [sbliss] Completed header; BFC'ed; misc cleanup
// 0 !HISTORY 2003-08-01 [PTadmin] Official Update 2003-02
// 0 !HISTORY 2007-10-26 [PTadmin] Header formatted for Contributor Agreement
// 0 !HISTORY 2008-07-01 [PTadmin] Official Update 2008-01
// 0 !HISTORY 2014-11-29 [Steffen] Renamed from 4073
// 0 !HISTORY 2014-12-28 [MagFors] Primitive substitution
// 0 !HISTORY 2015-10-11 [PTadmin] Official Update 2015-01
// 
// 
// 1 16 0 3 0 -1 0 0 0 -1.25 0 0 0 1 stud4.dat
  [1,16,0,3,0,-1,0,0,0,-1.25,0,0,0,1, ldraw_lib__stud4()],
// 1 16 0 3 0 -6 0 0 0 -1 0 0 0 6 4-4disc.dat
  [1,16,0,3,0,-6,0,0,0,-1,0,0,0,6, ldraw_lib__4_4disc()],
// 1 16 0 3 0 -2 0 0 0 -1 0 0 0 2 4-4ring4.dat
  [1,16,0,3,0,-2,0,0,0,-1,0,0,0,2, ldraw_lib__4_4ring4()],
// 1 16 0 0 0 10 0 0 0 3 0 0 0 10 4-4cylo.dat
  [1,16,0,0,0,10,0,0,0,3,0,0,0,10, ldraw_lib__4_4cylo()],
// 1 16 0 0 0 2 0 0 0 1 0 0 0 2 4-4ring4.dat
  [1,16,0,0,0,2,0,0,0,1,0,0,0,2, ldraw_lib__4_4ring4()],
// 1 16 0 0 0 2 0 0 0 1 0 0 0 2 4-4ring3.dat
  [1,16,0,0,0,2,0,0,0,1,0,0,0,2, ldraw_lib__4_4ring3()],
// 1 16 0 0 0 1 0 0 0 1 0 0 0 1 stud.dat
  [1,16,0,0,0,1,0,0,0,1,0,0,0,1, ldraw_lib__stud()],
];
makepoly(ldraw_lib__6141(), line=0.2);
// main file
use <../lib.scad>
use <6141.scad>
function ldraw_lib__30057() = [
// 0 =Plate  1 x  1 Round
// 0 Name: 30057.dat
// 0 Author: Rolf Osterthun [Rolf]
// 0 !LDRAW_ORG Part Alias UPDATE 2015-01
// 0 !LICENSE Licensed under CC BY 2.0 and CC BY 4.0 : see CAreadme.txt
// 
// 0 BFC CERTIFY CCW
  [0,"BFC","CERTIFY"],
  [0,"BFC","CCW"],
// 
// 0 !HISTORY 2015-10-11 [PTadmin] Official Update 2015-01
// 
// 
// 0 // Alias of 6141
// 0 // Part 30057 is the transparent counterpart of 6141
// 
// 1 16 0 0 0 1 0 0 0 1 0 0 0 1 6141.dat
  [1,16,0,0,0,1,0,0,0,1,0,0,0,1, ldraw_lib__6141()],
];
makepoly(ldraw_lib__30057(), line=0.2);
